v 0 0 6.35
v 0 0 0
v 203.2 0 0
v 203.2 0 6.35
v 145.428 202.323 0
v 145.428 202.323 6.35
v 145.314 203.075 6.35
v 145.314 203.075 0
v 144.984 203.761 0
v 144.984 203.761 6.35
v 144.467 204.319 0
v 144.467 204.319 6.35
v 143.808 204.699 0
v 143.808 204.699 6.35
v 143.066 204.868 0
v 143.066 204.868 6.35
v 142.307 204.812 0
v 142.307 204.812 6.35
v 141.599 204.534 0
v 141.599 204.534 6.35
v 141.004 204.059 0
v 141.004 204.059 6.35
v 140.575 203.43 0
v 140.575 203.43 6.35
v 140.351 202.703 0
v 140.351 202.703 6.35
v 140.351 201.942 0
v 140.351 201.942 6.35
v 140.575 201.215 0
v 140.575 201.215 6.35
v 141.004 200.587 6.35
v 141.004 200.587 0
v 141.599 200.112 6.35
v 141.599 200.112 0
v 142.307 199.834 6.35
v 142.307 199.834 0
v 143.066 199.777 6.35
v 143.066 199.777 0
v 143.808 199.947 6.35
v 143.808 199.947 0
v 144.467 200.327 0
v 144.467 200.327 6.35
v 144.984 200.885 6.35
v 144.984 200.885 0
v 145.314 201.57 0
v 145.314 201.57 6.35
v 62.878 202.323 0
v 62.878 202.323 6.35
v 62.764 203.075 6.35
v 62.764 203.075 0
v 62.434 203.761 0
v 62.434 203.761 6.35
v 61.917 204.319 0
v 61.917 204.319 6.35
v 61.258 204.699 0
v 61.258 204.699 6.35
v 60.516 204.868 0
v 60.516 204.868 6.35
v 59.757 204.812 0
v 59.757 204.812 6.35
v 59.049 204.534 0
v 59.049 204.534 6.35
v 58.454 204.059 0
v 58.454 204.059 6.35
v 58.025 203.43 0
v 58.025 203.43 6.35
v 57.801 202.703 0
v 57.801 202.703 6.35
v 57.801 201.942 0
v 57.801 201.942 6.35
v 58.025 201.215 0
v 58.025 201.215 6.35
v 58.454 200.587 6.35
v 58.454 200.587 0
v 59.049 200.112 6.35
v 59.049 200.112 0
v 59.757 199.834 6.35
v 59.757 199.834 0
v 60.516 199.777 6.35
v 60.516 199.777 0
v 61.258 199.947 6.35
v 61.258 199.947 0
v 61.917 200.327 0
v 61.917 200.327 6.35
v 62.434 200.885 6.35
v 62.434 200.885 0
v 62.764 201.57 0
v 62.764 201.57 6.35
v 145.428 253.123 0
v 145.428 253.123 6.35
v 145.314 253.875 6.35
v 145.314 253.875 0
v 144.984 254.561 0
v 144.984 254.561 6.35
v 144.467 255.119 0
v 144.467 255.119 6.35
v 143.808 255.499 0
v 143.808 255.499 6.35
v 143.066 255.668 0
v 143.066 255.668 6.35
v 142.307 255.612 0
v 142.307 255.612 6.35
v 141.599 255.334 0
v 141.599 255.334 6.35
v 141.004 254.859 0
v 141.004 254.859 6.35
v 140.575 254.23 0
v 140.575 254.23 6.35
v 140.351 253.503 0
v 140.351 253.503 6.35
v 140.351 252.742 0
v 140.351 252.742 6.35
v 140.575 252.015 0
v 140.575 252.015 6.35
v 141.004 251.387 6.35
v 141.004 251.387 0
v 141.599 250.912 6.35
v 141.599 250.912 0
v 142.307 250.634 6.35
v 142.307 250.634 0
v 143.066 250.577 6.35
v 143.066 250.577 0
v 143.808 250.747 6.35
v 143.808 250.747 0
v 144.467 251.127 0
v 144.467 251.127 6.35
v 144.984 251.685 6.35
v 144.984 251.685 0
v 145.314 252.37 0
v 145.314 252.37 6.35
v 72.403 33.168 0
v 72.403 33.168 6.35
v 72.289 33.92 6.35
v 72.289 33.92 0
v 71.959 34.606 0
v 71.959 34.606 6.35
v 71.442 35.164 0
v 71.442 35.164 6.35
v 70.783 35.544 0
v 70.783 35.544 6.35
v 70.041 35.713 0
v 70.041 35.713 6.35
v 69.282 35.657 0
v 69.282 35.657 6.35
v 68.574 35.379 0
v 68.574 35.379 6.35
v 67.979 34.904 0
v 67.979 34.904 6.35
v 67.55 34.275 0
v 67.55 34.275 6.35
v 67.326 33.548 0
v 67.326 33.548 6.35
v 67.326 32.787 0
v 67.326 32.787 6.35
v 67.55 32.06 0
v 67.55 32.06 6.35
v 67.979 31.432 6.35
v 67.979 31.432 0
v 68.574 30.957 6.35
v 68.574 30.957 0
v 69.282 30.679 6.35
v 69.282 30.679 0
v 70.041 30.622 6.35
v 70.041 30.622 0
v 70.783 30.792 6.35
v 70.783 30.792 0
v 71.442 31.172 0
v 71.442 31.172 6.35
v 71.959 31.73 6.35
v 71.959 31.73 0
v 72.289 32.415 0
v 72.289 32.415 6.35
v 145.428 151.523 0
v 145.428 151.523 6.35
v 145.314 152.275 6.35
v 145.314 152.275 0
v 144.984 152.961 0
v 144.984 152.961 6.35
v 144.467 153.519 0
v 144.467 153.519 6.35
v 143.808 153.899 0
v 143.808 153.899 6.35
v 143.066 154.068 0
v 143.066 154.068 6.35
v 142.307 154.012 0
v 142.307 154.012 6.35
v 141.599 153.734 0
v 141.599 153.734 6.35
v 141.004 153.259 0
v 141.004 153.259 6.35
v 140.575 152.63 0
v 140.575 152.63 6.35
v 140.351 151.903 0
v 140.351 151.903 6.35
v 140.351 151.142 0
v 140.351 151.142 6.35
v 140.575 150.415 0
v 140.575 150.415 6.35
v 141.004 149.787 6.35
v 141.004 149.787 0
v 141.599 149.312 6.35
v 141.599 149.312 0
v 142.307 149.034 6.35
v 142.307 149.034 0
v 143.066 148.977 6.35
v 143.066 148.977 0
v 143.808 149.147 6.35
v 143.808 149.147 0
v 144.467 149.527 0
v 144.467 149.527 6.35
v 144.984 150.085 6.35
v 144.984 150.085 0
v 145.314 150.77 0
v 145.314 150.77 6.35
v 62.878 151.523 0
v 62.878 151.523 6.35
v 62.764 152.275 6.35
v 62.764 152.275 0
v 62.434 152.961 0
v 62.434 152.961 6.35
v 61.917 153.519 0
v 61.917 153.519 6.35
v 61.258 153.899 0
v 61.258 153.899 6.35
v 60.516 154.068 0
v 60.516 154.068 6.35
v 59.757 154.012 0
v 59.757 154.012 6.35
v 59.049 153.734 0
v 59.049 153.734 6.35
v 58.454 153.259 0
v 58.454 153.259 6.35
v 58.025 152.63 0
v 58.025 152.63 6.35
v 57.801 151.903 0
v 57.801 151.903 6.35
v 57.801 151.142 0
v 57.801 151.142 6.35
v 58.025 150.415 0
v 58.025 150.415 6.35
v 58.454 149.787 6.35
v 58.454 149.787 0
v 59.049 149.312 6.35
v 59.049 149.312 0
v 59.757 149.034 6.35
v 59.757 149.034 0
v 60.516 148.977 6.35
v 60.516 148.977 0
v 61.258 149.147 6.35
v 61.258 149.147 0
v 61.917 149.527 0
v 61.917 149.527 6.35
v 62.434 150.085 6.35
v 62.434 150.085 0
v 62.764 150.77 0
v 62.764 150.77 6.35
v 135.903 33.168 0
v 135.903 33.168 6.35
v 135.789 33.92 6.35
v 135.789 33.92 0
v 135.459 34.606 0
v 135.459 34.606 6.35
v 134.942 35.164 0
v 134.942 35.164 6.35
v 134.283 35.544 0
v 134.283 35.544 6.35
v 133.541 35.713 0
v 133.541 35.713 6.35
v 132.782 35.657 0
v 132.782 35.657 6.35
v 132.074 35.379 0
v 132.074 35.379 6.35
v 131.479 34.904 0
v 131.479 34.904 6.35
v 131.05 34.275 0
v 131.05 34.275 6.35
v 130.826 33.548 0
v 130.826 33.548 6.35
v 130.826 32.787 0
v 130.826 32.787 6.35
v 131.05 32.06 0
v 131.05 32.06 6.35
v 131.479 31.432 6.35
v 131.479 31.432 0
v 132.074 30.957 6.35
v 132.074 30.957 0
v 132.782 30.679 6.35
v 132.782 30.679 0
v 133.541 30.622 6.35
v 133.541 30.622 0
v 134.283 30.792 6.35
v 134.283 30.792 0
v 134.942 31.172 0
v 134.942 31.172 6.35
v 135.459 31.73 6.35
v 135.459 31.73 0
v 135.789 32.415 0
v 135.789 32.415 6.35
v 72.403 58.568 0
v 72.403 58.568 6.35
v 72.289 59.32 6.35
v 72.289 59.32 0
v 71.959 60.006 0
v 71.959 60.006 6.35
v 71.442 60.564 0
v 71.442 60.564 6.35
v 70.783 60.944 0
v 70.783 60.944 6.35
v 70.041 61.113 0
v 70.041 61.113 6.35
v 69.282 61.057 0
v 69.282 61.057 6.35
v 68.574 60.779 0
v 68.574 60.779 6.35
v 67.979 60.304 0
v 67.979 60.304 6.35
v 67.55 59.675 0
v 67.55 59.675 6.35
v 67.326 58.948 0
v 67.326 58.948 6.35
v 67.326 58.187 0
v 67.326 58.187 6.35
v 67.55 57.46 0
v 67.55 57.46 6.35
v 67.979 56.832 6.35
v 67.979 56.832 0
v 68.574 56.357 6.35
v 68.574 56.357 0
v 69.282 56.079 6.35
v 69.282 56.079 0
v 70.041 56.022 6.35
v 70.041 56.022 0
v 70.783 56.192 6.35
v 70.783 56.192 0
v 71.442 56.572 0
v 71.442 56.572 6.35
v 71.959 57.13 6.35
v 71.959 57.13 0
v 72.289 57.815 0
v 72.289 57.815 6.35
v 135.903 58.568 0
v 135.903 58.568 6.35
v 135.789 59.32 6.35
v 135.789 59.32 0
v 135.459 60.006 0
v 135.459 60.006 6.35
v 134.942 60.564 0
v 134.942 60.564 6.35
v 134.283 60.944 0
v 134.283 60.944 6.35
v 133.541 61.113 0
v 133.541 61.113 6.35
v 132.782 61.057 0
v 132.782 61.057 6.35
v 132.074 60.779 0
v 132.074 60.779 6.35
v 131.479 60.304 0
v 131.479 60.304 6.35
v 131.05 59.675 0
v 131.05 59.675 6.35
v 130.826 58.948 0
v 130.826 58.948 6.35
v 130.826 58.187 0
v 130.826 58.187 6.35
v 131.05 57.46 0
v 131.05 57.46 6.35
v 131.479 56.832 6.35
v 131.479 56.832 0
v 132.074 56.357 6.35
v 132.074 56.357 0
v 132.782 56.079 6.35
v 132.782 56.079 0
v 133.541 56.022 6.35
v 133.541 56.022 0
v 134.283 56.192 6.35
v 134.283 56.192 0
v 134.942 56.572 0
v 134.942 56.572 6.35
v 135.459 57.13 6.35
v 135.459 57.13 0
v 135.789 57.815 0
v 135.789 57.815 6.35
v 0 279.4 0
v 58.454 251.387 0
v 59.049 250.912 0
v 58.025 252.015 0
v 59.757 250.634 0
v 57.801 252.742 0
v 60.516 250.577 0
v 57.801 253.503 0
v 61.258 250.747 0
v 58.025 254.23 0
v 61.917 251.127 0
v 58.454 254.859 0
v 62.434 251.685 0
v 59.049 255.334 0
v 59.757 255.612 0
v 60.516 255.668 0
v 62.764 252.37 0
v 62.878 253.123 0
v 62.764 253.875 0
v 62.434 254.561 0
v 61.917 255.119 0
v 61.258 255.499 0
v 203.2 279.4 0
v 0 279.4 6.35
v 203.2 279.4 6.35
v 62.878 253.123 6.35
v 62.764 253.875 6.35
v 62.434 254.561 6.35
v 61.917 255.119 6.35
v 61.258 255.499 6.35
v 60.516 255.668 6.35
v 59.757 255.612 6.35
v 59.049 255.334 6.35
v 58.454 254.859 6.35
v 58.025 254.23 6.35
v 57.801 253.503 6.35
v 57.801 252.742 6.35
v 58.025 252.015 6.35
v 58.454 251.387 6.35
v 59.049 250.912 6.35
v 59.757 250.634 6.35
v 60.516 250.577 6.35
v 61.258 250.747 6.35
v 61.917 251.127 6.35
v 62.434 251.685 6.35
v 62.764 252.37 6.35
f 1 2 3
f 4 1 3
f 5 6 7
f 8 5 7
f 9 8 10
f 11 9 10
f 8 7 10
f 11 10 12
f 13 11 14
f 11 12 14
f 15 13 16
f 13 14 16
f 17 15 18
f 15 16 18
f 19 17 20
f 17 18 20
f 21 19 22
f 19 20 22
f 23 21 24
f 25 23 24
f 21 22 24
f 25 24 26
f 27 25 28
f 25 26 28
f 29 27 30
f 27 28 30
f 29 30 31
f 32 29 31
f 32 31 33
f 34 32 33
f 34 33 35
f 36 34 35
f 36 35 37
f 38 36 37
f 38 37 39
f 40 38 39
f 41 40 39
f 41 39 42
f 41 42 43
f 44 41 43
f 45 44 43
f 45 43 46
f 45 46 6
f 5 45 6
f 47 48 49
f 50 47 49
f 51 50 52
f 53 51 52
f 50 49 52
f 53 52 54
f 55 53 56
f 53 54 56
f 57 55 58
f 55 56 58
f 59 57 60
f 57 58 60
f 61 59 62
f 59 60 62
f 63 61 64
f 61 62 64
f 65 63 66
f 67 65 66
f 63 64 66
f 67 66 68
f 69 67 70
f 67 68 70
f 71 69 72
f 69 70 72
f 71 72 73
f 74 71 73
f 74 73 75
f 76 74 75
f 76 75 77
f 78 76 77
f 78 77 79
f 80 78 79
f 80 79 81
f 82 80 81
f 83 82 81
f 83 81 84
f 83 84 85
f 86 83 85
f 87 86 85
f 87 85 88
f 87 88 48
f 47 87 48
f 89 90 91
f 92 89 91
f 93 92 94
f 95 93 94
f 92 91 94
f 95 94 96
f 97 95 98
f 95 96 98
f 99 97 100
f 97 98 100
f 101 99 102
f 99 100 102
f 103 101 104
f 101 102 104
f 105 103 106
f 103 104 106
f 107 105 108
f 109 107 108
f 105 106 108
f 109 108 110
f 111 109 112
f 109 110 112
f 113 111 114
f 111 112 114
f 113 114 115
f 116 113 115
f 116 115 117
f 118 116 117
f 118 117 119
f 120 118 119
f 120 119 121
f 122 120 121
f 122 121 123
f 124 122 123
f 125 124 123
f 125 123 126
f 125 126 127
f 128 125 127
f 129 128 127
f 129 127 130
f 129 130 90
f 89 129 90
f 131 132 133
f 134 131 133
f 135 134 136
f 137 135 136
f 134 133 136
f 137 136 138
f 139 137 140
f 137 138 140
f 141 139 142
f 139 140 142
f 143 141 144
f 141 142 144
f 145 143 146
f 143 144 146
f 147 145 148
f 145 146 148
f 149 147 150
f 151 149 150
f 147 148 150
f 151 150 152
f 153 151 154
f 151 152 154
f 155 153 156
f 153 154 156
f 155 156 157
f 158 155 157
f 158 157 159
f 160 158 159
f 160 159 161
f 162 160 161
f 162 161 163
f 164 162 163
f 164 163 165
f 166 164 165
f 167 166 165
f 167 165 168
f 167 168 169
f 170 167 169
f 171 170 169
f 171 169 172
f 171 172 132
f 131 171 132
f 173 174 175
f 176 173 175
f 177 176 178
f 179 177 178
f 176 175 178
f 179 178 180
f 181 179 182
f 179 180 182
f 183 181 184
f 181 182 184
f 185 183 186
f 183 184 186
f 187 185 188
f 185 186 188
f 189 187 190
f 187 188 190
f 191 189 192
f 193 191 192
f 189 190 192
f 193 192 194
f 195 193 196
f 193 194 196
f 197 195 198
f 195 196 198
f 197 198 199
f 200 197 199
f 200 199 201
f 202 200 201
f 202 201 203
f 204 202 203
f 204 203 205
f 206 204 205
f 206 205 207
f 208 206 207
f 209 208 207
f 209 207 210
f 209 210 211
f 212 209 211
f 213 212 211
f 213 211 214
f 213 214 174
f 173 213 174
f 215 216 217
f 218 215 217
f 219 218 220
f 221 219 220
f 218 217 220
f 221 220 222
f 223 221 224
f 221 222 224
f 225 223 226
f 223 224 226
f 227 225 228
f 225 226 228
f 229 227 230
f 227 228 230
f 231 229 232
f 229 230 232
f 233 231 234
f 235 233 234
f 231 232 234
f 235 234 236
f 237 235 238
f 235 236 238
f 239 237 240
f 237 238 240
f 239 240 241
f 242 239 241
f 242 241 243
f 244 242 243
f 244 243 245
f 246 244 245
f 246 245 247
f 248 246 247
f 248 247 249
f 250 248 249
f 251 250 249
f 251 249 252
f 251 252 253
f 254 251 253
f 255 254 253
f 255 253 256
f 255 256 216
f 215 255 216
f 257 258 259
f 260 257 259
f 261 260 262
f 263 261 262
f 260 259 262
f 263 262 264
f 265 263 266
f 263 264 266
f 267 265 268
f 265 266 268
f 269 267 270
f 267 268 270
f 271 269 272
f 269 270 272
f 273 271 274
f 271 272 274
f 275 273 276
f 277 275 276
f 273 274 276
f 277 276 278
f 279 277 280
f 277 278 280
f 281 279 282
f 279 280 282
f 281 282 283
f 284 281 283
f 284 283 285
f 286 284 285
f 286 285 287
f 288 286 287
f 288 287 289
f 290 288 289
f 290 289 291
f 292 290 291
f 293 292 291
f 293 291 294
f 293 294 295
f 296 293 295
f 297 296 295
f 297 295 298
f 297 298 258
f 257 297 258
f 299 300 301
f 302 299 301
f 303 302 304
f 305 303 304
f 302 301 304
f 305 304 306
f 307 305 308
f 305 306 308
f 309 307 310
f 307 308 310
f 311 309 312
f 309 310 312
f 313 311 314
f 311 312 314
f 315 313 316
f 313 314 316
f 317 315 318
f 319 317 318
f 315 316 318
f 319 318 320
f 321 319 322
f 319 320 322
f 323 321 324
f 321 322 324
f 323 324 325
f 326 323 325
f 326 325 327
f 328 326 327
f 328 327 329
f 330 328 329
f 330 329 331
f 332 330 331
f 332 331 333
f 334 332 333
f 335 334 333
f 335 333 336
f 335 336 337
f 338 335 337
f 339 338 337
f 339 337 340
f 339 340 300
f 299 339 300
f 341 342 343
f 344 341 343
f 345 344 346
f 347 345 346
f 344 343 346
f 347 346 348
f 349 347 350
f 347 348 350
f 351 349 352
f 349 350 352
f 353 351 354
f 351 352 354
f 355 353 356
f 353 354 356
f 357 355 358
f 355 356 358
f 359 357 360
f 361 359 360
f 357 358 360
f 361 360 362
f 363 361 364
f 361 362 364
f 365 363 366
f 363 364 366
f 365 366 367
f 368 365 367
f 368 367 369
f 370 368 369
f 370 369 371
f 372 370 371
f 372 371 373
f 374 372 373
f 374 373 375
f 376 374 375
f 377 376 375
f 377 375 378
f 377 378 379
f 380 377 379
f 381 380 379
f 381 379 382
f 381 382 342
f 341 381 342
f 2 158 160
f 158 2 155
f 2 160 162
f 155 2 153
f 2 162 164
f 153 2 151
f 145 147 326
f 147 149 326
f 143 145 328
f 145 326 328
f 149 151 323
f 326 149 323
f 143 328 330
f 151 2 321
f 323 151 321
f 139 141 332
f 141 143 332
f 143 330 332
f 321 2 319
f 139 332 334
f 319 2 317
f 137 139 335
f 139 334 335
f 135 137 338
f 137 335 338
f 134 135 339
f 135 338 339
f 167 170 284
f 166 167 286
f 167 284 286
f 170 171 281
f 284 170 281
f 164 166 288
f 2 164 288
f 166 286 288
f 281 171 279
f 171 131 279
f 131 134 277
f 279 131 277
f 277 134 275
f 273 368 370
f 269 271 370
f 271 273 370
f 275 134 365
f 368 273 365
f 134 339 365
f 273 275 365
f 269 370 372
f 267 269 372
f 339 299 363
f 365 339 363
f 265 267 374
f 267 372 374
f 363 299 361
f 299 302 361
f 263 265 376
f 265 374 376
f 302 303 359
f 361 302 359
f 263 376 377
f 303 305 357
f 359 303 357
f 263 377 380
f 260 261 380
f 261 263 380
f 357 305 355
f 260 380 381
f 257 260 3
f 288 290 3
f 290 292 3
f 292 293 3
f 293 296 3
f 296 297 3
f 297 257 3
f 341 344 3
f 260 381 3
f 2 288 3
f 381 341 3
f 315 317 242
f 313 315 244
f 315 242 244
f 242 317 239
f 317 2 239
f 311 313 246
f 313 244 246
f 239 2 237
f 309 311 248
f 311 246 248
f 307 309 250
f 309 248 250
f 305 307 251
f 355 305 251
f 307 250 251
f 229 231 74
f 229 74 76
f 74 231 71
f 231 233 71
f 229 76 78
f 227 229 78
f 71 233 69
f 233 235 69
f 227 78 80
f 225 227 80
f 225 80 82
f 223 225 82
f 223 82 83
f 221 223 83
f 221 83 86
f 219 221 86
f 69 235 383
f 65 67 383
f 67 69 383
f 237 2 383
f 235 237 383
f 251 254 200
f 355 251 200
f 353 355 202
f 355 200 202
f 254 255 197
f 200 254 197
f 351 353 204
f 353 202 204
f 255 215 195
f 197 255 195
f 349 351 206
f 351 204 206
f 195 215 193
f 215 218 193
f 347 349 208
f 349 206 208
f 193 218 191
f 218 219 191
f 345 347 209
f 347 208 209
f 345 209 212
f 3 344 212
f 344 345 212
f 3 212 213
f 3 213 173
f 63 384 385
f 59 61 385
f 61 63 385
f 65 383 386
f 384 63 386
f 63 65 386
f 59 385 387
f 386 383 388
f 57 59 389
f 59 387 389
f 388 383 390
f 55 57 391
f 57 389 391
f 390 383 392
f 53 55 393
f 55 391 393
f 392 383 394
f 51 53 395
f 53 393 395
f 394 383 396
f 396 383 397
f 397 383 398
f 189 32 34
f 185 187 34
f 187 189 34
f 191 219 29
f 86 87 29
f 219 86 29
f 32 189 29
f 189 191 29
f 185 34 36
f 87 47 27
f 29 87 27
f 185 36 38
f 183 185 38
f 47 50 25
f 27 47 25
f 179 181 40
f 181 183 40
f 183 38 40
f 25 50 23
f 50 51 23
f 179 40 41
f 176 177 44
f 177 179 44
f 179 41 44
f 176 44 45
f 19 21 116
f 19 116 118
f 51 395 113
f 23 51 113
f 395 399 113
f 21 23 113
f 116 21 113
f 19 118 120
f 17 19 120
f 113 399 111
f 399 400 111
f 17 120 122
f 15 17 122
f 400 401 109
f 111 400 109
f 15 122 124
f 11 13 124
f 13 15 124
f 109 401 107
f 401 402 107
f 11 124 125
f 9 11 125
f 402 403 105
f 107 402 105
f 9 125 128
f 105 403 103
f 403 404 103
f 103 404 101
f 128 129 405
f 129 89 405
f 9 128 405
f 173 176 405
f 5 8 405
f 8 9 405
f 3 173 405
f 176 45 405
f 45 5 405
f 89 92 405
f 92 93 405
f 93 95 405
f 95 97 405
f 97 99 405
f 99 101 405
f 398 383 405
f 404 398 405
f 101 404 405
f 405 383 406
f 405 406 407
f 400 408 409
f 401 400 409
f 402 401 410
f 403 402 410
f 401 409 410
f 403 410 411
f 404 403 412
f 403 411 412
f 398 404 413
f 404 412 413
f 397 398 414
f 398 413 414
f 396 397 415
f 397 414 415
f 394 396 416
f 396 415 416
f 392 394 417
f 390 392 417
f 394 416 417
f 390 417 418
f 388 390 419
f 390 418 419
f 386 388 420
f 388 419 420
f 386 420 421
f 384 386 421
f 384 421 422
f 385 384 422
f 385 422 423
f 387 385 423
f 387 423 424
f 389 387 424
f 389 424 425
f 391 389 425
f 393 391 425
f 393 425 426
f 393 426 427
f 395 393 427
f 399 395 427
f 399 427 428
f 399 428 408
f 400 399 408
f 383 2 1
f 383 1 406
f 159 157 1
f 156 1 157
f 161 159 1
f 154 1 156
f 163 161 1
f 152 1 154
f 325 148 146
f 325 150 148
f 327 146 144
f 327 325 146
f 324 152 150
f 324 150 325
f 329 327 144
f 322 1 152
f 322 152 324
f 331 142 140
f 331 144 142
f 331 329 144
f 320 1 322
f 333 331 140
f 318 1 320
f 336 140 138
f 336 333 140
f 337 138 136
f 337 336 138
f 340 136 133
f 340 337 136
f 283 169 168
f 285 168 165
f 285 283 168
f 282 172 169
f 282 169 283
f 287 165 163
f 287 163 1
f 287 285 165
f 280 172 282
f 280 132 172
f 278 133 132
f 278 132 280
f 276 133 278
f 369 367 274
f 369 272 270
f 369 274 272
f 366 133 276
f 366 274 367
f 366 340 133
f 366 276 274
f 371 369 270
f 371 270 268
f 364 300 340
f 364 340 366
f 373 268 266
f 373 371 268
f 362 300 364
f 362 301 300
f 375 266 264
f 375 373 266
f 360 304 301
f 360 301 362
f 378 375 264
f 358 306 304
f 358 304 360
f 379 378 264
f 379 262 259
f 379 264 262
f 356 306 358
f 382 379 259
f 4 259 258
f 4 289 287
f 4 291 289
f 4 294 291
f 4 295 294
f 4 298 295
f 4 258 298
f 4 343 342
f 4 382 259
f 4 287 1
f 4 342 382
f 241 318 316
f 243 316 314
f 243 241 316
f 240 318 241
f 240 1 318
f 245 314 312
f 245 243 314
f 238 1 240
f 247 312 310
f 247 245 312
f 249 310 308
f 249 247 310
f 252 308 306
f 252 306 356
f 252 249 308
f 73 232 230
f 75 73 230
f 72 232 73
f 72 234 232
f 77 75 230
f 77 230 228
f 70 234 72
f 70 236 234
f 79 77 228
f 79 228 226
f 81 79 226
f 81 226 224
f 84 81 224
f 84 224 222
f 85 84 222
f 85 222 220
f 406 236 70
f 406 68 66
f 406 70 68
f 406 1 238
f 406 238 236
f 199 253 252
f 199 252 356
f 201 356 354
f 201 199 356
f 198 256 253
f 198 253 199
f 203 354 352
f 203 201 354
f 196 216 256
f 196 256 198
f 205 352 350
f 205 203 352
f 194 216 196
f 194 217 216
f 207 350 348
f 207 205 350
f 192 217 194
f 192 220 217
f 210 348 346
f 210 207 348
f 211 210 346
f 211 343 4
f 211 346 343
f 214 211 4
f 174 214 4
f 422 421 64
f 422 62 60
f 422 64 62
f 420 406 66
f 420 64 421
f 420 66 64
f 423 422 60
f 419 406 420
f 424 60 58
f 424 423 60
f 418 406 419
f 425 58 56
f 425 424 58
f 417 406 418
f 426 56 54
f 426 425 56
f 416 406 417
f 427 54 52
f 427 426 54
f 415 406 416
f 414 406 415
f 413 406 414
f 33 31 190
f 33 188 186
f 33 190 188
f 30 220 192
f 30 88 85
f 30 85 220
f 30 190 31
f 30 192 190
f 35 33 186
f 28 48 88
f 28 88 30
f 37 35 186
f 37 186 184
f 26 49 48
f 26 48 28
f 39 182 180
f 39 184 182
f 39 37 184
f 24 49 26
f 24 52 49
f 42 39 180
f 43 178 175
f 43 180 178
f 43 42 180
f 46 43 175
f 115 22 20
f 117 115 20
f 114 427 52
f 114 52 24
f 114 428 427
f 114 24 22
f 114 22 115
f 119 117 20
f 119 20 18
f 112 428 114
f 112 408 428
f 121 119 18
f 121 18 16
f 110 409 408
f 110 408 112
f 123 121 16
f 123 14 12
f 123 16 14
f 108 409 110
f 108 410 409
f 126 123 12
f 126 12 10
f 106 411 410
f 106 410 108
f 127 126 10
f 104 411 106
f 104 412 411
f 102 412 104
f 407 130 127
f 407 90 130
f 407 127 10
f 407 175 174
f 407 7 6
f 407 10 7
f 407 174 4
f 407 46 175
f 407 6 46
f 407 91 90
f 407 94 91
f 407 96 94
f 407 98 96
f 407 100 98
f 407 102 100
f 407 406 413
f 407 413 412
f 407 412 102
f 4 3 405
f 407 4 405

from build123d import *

# Parameters (mm, degrees)
SKETCH1_W                   = 203.2
SKETCH1_H                   = 279.4
BOSS_EXTRUDE1_DEPTH         = 6.35
F_1_4_20_TAPPED_HOLE1_D     = 5.1054
F_1_4_20_TAPPED_HOLE1_DEPTH = 8.81126
F_1_4_20_TAPPED_HOLE1_TIP   = 1.533816902


with BuildPart() as part:
    # Sketch1 → Boss-Extrude1 (new body)
    with BuildSketch(Plane.XY):
        with Locations((101.6, 139.7)):
            Rectangle(SKETCH1_W, SKETCH1_H)
    extrude(amount=BOSS_EXTRUDE1_DEPTH)

    # 1/4-20 Tapped Hole1
    with Locations(Plane(origin=(0, 0, 0), x_dir=(-1, 0, 0), z_dir=(0, 0, -1))):
        with Locations((-60.325, 253.122878716), (-142.875, 253.122878716), (-142.875, 202.322878716), (-142.875, 151.522878716), (-60.325, 151.522878716), (-60.325, 202.322878716), (-133.349999974, 58.567878716), (-133.349999974, 33.167878716), (-69.849999974, 33.167878716), (-69.849999974, 58.567878716)):
            Hole(F_1_4_20_TAPPED_HOLE1_D / 2, depth=F_1_4_20_TAPPED_HOLE1_DEPTH)
            with Locations((0, 0, -(F_1_4_20_TAPPED_HOLE1_DEPTH + F_1_4_20_TAPPED_HOLE1_TIP / 2))):  # 118° drill point
                Cone(0, F_1_4_20_TAPPED_HOLE1_D / 2, F_1_4_20_TAPPED_HOLE1_TIP, mode=Mode.SUBTRACT)


solid = part.part
